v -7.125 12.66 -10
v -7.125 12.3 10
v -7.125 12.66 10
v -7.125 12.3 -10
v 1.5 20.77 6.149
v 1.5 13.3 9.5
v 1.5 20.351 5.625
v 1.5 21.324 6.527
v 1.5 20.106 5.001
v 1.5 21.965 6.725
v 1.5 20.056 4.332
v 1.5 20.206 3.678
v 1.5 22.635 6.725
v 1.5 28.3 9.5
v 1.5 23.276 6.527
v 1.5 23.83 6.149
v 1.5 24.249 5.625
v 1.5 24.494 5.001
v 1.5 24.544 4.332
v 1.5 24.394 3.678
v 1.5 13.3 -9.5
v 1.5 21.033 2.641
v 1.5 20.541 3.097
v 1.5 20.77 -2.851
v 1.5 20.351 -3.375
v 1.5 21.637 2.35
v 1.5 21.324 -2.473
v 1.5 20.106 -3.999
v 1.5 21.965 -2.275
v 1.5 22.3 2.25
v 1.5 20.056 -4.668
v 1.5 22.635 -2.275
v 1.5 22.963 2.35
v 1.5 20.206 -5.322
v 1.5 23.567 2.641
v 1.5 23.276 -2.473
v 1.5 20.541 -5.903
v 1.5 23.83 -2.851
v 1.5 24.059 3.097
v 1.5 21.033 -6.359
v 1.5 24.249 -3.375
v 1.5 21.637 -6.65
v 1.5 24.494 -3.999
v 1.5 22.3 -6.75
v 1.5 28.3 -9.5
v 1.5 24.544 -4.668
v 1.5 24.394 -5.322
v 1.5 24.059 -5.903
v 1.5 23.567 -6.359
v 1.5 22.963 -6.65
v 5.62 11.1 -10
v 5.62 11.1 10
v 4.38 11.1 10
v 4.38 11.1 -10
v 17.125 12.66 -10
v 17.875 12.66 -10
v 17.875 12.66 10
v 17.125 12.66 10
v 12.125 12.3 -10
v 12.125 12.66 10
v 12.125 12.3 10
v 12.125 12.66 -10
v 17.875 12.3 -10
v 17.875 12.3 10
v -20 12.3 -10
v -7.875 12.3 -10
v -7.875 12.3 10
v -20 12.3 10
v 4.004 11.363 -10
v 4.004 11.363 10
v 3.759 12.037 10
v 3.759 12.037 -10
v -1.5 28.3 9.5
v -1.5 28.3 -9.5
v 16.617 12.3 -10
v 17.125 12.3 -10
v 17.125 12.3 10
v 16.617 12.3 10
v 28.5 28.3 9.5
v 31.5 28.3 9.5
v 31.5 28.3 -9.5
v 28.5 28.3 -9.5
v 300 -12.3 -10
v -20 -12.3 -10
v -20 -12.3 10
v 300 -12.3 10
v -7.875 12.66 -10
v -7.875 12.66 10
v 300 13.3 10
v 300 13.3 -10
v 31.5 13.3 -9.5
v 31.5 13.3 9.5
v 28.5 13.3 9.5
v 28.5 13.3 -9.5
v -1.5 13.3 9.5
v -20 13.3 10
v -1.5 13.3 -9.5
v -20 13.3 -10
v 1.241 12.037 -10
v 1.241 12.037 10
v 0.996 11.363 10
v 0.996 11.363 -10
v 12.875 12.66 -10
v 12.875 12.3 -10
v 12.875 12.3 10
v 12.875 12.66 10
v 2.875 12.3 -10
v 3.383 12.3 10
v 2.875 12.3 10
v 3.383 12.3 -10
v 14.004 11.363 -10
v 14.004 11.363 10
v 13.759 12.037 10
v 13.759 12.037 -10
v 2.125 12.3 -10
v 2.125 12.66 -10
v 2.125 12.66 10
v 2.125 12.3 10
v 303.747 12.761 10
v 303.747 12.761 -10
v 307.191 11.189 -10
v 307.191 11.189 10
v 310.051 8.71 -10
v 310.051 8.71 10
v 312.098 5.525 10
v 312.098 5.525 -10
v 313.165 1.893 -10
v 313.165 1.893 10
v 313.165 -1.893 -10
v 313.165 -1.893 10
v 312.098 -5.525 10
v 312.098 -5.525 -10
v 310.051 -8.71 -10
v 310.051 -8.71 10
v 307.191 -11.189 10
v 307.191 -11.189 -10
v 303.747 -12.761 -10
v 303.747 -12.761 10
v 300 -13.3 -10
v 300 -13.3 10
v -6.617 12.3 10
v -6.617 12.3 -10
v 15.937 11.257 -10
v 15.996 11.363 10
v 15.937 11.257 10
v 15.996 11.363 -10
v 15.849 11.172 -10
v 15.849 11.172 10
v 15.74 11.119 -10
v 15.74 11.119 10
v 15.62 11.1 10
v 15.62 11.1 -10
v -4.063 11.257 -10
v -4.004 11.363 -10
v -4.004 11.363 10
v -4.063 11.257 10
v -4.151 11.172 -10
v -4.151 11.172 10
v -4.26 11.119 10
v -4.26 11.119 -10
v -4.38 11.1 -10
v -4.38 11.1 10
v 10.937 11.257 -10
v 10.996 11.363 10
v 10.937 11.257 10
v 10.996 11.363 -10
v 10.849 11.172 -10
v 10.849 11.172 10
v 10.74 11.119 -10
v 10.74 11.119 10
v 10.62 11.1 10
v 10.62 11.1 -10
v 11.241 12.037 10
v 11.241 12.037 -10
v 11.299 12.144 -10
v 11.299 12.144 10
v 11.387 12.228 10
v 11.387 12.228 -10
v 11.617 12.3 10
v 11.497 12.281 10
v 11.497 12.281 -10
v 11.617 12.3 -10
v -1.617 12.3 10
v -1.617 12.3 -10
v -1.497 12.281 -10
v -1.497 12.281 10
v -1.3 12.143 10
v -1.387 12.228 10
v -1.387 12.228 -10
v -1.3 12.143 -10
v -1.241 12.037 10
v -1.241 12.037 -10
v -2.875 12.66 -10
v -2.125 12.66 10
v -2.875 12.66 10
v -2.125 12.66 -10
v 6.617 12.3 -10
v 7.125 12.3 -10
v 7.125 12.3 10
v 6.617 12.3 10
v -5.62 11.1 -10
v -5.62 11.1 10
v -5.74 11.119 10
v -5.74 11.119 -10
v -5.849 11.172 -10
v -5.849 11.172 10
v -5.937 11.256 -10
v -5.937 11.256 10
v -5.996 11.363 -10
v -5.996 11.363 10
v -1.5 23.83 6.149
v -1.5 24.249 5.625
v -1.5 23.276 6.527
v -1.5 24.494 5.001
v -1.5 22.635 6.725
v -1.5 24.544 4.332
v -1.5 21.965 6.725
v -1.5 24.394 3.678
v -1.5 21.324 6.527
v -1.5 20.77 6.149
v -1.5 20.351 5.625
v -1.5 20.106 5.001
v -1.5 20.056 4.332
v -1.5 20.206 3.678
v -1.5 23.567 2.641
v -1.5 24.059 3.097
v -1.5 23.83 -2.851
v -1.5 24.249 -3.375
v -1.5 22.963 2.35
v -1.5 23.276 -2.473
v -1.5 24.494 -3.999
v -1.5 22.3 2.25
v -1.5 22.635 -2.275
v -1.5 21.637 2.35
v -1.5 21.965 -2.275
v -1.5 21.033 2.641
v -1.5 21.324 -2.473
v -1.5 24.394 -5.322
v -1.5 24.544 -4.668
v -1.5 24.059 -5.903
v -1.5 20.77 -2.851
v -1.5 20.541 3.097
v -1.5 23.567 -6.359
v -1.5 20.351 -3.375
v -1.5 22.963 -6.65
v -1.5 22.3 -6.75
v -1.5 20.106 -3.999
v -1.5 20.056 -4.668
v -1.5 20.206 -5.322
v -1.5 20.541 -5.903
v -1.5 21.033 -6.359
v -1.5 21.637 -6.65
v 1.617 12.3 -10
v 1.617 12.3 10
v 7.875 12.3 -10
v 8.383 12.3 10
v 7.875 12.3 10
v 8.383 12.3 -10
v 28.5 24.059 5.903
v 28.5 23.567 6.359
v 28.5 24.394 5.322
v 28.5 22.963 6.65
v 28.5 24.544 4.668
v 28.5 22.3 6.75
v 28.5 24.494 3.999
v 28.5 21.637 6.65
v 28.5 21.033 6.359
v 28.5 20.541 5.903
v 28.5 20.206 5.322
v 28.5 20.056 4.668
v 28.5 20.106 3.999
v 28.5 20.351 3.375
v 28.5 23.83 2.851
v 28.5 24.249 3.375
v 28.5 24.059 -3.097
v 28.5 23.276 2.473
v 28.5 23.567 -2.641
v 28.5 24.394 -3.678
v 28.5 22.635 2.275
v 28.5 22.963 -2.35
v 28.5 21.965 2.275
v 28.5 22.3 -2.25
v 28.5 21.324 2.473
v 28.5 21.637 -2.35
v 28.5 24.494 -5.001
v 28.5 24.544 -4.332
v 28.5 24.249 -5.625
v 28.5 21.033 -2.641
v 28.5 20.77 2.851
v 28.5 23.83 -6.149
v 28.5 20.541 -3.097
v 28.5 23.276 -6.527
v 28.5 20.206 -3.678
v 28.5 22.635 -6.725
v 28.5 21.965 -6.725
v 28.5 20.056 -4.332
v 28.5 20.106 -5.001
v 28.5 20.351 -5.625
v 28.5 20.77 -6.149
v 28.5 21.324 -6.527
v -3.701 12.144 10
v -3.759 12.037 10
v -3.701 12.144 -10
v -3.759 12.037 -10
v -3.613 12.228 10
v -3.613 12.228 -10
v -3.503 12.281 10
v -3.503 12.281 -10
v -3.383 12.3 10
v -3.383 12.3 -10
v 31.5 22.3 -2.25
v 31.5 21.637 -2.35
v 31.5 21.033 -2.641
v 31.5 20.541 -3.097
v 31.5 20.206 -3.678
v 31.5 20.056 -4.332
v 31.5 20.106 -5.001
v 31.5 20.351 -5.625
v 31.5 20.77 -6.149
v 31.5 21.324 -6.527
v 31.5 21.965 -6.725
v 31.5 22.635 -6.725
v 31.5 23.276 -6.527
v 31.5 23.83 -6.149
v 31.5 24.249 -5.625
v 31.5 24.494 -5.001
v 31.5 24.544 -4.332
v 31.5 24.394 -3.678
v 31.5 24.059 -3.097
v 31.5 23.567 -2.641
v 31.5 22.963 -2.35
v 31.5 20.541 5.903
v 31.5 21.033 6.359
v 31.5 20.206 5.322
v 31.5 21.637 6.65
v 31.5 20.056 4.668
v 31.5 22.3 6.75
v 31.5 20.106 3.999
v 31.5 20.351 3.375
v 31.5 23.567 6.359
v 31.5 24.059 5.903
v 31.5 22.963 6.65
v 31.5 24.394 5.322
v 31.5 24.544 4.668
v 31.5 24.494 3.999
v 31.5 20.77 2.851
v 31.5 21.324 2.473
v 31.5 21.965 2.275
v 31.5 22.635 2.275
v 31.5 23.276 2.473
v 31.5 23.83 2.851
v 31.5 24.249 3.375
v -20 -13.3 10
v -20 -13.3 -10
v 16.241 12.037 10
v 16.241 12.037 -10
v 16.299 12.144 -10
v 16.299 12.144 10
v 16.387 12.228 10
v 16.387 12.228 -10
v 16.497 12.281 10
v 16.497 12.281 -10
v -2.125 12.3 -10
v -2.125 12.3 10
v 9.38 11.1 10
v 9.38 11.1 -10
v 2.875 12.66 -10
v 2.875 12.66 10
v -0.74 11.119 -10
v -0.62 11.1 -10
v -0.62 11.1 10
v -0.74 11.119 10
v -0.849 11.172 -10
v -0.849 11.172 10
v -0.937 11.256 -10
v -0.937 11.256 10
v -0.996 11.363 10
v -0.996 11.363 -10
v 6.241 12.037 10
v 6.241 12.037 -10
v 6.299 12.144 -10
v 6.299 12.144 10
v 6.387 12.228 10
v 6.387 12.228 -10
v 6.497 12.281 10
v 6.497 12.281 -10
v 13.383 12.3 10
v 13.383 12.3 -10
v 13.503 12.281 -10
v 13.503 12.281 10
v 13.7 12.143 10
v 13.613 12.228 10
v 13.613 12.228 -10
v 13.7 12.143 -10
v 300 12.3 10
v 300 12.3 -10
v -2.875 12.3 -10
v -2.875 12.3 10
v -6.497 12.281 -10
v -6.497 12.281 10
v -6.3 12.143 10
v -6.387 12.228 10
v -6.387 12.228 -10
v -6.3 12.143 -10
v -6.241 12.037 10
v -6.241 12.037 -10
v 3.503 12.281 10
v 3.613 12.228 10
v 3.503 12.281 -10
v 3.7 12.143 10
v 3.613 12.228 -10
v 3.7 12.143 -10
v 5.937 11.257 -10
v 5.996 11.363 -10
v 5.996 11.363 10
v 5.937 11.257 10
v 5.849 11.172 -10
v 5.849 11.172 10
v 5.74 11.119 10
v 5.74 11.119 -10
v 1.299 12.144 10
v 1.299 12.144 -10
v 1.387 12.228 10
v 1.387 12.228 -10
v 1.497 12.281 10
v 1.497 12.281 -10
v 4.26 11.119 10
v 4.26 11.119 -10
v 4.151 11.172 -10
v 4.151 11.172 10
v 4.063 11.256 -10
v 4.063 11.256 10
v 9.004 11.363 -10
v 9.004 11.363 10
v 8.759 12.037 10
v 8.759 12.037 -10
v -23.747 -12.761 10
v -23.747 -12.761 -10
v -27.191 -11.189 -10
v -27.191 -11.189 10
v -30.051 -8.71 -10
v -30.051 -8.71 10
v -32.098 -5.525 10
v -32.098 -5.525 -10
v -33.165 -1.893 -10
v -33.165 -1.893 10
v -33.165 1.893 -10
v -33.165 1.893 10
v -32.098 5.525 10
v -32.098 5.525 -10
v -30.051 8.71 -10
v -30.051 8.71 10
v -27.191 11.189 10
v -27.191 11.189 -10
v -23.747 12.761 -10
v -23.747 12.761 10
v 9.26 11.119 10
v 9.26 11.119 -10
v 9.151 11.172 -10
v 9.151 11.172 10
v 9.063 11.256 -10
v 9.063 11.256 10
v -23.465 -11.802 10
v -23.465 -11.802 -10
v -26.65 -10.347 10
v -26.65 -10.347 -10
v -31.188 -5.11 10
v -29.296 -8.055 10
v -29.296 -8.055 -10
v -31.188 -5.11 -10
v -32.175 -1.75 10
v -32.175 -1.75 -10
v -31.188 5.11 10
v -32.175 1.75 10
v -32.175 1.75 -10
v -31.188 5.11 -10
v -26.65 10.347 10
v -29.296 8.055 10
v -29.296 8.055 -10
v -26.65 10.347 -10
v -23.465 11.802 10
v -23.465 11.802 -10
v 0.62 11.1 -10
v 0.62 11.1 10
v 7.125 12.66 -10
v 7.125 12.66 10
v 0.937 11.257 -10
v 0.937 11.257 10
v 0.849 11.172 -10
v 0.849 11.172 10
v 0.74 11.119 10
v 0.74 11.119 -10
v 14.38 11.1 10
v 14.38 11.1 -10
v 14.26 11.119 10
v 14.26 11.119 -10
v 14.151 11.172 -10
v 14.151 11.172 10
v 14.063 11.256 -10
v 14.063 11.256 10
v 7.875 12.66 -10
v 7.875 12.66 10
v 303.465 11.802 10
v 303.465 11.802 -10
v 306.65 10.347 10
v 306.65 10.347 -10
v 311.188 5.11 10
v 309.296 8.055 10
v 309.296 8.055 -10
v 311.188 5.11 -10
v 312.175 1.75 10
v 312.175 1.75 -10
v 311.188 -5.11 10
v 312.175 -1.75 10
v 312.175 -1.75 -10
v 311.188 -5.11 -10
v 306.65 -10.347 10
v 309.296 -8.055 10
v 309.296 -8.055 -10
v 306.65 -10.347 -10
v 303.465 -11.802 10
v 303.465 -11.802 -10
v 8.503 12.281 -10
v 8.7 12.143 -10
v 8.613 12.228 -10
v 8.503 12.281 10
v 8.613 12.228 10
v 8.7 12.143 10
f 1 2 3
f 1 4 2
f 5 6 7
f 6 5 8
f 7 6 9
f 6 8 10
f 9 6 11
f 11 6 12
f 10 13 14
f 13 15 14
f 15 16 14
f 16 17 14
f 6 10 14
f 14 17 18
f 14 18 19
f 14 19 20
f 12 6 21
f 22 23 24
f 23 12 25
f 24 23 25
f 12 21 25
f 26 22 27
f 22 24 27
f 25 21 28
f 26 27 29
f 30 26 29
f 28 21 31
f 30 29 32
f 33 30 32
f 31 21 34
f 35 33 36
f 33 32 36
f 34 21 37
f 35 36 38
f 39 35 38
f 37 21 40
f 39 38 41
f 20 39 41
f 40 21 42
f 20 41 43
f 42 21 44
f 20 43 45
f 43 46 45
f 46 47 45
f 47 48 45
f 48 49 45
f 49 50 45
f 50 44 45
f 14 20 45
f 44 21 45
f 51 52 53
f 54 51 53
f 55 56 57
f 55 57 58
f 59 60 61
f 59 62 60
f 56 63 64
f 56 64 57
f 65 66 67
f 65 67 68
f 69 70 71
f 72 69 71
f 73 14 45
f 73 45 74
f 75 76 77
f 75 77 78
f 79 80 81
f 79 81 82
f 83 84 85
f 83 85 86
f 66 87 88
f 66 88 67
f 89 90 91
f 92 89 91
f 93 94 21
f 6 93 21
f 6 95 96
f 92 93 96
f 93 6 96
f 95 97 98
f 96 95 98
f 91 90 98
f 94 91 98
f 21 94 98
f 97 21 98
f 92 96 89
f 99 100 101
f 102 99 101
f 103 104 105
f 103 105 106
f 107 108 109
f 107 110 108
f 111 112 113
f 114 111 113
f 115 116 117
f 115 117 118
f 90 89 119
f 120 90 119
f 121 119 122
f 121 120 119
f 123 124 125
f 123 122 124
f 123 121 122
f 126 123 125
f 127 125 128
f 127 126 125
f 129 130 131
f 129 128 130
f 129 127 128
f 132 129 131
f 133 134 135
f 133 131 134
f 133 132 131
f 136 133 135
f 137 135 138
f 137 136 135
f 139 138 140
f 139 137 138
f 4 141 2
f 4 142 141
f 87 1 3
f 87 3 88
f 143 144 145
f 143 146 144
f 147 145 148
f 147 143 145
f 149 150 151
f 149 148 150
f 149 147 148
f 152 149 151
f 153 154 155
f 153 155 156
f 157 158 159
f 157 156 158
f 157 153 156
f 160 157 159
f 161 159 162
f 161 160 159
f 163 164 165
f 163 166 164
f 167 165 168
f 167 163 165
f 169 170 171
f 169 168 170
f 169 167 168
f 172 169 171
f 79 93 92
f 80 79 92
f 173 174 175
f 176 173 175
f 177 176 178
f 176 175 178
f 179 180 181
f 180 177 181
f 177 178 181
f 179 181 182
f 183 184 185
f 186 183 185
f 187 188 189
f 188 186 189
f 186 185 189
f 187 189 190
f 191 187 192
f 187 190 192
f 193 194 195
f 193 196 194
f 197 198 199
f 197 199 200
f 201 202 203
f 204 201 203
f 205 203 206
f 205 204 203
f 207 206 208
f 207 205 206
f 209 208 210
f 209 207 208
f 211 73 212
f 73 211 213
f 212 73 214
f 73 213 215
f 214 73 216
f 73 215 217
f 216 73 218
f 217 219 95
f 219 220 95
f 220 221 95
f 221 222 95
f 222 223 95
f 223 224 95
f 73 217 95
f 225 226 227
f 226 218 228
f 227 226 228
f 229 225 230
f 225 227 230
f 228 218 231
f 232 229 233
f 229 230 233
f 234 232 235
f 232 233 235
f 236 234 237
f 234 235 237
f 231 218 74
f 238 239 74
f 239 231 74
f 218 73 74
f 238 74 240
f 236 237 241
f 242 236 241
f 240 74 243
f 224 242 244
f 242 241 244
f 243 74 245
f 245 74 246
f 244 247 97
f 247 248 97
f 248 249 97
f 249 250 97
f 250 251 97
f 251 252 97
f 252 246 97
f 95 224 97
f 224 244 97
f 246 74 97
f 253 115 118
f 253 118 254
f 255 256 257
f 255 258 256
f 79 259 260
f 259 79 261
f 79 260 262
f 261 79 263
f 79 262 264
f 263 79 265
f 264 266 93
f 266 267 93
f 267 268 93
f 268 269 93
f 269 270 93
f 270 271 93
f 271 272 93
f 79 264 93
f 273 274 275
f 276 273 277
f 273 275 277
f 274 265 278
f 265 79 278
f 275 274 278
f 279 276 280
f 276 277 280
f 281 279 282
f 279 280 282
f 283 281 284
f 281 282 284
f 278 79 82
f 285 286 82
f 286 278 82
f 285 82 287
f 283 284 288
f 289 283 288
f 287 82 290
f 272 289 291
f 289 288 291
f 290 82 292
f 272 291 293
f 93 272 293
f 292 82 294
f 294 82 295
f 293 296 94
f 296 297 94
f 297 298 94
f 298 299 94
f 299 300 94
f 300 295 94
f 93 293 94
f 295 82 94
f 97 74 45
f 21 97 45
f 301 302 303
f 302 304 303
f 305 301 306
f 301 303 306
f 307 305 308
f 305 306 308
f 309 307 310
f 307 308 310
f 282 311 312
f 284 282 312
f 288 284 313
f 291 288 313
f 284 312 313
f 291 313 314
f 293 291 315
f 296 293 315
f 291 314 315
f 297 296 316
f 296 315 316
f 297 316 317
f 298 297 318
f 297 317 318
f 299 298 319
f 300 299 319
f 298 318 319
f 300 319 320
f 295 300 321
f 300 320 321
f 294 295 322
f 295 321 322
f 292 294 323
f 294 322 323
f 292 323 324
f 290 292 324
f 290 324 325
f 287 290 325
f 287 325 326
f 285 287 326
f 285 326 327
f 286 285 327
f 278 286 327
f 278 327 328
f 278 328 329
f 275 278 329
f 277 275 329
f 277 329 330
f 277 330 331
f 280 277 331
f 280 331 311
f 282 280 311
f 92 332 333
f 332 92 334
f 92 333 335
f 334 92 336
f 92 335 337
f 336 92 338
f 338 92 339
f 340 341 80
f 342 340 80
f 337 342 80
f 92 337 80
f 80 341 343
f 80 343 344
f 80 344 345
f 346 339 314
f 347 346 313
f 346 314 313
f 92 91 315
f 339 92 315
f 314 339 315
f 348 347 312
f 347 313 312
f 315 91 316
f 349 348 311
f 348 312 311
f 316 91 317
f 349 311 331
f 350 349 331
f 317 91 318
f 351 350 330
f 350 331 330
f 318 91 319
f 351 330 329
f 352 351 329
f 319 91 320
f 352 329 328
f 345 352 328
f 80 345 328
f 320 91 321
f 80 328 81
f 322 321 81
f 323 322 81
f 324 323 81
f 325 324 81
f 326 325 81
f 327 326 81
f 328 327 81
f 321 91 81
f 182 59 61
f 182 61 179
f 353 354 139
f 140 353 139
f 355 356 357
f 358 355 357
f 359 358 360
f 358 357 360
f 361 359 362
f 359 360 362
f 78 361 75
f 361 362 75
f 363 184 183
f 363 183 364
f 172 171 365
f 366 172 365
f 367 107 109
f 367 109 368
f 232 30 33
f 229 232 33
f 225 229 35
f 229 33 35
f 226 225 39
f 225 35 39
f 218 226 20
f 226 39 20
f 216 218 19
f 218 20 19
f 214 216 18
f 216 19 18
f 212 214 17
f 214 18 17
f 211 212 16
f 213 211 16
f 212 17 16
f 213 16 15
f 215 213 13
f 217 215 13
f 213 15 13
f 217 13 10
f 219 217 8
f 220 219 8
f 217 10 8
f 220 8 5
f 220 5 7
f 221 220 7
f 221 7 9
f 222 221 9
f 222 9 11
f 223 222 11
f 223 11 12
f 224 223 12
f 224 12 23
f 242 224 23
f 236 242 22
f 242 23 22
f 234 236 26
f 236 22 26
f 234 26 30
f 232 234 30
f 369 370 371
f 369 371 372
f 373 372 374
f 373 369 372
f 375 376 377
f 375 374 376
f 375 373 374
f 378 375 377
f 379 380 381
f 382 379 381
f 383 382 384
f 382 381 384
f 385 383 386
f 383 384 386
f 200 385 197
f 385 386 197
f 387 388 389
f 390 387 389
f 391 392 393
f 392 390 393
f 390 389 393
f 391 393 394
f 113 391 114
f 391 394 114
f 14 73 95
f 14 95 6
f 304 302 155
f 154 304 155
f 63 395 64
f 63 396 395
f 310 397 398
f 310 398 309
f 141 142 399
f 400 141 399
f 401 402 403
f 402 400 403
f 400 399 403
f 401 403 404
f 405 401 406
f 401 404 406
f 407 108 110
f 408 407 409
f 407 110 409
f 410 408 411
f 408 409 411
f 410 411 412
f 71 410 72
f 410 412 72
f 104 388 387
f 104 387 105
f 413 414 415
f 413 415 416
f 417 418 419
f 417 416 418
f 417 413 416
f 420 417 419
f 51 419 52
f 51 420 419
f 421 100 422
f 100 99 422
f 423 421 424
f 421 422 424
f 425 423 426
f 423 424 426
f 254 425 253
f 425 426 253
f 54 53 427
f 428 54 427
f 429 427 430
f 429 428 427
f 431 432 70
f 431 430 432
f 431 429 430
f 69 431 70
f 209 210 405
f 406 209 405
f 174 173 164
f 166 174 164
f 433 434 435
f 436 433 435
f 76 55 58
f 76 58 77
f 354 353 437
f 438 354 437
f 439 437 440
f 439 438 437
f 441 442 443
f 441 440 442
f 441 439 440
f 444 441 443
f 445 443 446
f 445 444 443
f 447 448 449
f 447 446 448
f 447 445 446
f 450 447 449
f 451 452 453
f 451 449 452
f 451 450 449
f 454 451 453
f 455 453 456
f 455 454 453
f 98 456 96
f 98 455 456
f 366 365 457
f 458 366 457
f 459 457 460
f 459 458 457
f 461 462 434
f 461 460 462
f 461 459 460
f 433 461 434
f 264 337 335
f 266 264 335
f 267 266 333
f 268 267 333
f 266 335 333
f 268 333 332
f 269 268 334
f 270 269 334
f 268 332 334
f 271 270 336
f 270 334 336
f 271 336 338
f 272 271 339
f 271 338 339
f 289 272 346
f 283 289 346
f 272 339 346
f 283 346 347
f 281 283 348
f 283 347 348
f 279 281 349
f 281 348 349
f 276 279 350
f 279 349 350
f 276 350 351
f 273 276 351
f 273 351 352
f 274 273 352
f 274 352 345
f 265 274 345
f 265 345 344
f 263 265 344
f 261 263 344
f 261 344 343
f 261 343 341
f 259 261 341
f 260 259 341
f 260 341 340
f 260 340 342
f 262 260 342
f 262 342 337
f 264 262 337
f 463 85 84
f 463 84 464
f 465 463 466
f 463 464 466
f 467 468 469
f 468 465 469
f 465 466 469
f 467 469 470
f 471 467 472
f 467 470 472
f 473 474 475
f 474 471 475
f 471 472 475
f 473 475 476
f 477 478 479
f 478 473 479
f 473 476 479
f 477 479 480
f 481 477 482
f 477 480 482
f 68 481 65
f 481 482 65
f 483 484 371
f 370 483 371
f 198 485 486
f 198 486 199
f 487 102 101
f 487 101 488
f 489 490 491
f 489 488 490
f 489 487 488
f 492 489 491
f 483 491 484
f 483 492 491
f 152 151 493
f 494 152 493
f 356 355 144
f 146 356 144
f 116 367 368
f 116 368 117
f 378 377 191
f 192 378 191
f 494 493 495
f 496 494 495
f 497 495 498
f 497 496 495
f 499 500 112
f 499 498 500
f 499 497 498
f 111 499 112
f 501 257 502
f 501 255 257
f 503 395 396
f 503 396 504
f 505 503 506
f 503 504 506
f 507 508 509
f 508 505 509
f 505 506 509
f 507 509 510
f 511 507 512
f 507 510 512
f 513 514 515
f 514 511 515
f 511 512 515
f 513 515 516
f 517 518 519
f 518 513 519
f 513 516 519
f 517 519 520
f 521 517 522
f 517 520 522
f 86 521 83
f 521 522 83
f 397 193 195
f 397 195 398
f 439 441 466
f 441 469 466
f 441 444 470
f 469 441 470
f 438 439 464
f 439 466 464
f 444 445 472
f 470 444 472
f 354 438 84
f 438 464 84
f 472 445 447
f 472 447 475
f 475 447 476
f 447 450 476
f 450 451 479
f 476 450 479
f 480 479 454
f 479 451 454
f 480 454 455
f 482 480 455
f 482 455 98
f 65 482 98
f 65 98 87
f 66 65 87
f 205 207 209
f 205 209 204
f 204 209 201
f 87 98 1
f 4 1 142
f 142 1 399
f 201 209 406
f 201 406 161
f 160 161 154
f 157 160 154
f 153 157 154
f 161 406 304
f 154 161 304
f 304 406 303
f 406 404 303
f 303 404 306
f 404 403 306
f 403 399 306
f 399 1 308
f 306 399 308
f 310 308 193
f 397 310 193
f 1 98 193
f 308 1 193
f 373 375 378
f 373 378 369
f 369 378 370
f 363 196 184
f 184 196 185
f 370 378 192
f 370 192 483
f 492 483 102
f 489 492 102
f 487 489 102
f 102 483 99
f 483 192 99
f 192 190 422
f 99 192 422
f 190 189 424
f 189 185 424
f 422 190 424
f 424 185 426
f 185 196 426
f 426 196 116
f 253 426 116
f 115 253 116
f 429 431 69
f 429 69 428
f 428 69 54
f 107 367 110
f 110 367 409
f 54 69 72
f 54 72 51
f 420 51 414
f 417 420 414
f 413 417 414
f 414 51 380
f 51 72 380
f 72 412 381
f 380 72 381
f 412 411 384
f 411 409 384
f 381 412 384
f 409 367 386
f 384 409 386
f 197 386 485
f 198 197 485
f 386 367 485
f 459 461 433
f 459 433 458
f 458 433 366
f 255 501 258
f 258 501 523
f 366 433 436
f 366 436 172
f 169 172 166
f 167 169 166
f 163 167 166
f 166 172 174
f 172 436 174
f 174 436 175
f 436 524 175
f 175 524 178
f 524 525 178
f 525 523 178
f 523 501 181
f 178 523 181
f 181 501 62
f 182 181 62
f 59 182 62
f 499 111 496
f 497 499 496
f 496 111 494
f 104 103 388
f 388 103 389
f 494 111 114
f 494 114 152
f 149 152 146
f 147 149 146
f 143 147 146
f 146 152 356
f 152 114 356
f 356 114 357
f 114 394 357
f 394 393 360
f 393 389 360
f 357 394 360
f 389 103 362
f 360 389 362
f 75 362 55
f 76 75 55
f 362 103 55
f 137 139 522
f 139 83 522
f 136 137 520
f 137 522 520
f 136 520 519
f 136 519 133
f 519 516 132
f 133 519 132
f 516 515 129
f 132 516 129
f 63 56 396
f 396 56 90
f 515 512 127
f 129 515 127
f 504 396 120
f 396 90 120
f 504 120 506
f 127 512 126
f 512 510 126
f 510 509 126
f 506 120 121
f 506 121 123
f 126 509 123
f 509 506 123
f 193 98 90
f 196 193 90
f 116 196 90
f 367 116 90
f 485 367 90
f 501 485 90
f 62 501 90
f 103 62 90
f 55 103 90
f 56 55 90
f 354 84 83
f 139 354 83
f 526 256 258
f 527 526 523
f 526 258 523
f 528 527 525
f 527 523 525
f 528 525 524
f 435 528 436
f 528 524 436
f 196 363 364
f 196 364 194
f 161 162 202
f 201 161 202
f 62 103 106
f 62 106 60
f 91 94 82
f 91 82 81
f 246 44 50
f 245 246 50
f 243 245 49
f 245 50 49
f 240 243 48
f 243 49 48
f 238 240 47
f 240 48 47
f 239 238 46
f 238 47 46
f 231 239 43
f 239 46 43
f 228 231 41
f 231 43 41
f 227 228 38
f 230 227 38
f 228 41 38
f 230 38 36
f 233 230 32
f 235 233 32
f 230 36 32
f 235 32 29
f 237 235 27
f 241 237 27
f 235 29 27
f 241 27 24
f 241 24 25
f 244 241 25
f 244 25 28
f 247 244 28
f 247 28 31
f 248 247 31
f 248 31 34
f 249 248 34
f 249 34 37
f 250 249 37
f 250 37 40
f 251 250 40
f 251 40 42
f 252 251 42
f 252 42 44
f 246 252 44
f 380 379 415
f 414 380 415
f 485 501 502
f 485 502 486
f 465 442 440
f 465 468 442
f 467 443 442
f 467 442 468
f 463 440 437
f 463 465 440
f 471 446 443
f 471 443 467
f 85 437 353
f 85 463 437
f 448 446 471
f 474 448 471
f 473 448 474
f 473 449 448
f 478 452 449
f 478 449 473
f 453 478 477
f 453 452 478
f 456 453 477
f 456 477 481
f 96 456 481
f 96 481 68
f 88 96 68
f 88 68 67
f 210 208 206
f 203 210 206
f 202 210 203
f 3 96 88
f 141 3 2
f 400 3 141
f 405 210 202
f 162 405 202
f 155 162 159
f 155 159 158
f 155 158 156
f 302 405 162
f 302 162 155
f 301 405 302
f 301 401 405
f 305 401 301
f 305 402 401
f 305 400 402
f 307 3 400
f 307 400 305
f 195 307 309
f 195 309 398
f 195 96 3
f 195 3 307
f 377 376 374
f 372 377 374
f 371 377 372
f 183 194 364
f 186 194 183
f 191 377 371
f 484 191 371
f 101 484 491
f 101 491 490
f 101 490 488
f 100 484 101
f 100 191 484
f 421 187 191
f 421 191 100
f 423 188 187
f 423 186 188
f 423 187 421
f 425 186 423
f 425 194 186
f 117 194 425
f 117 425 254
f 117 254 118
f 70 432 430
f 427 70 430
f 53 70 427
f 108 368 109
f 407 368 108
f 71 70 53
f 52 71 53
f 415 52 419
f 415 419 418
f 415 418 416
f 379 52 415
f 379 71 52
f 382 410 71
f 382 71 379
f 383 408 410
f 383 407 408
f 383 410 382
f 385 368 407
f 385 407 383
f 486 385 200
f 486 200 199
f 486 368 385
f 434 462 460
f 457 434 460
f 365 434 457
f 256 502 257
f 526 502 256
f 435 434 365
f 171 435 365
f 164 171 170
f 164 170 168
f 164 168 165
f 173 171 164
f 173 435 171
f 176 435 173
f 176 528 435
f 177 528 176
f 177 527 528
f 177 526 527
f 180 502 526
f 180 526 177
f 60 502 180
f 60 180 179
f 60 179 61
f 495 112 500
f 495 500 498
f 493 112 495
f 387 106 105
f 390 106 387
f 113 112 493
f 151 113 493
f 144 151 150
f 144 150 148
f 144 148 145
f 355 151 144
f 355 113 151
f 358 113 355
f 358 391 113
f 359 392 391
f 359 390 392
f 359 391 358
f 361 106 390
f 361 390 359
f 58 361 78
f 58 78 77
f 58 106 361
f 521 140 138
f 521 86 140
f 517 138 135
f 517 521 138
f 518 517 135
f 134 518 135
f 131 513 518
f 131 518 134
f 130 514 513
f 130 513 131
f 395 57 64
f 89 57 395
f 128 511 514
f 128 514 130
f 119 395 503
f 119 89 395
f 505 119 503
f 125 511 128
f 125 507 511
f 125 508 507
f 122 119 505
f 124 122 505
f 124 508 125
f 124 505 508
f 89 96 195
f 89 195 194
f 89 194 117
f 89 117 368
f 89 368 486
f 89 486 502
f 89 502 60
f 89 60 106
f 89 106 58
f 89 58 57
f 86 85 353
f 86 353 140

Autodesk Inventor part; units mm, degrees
ref_plane "XZ Plane" through (0, 0, 0) normal (0, 1, 0) x (-1, 0, 0)
sketch "Sketch_2" plane through (0, 0, 0) normal (0, 0, 1) x (1, 0, 0)
  arc A0 (-20, 13.3) -> (-20, -13.3) centre (-20, 0) ccw
  line L0 (-20, -13.3) -> (300, -13.3)
  arc A1 (300, -13.3) -> (300, 13.3) centre (300, 0) ccw
  line L1 (300, 13.3) -> (-20, 13.3)
extrude "Extrusion1" add sketch "Sketch_2" along normal mid plane 20
sketch "Sketch_8" plane through (0, 0, 0) normal (0, 0, 1) x (1, 0, 0)
  line L0 (-1.5, 28.3) -> (-1.5, 13.3)
  line L1 (-1.5, 13.3) -> (1.5, 13.3)
  line L2 (1.5, 13.3) -> (1.5, 28.3)
  line L3 (1.5, 28.3) -> (-1.5, 28.3)
extrude "Extrusion2" add sketch "Sketch_8" along normal mid plane 19
sketch "_____4" plane through (0, 0, 0) normal (1, 0, 0) x (0, 0, -1)
  circle A0 centre (-4.5, 22.3) radius 2.25
extrude "Extrusion3" cut sketch "_____4" along normal mid plane 6
sketch "_____5" plane through (0, 0, 0) normal (1, 0, 0) x (0, 0, -1)
  circle A0 centre (4.5, 22.3) radius 2.25
extrude "Extrusion4" cut sketch "_____5" along normal mid plane 6
sketch "_____2" plane through (0, 0, 0) normal (0, 0, 1) x (1, 0, 0)
  line L0 (28.5, 8.3) -> (31.5, 8.3)
  line L1 (31.5, 8.3) -> (31.5, 28.3)
  line L2 (31.5, 28.3) -> (28.5, 28.3)
  line L3 (28.5, 28.3) -> (28.5, 8.3)
extrude "Extrusion5" add sketch "_____2" along normal mid plane 19
sketch "Sketch6" plane through (28.5, 13.3, 9.5) normal (-1, 0, 0) x (0, 0, 1)
  point P0 (-14, 9)
hole "Hole1" at (28.5, 22.3, -4.5) direction (1, 0, 0) diameter 4.5 depth 3
sketch "Sketch7" plane through (28.5, 13.3, 9.5) normal (-1, 0, 0) x (0, 0, 1)
  point P0 (-5, 9)
hole "Hole2" at (28.5, 22.3, 4.5) direction (1, 0, 0) diameter 4.5 depth 3
sketch "Sketch_4" plane through (0, 0, 0) normal (0, 0, 1) x (1, 0, 0)
  arc A0 (-20, 12.3) -> (-20, -12.3) centre (-20, 0) ccw
  line L0 (-20, -12.3) -> (300, -12.3)
  arc A1 (300, -12.3) -> (300, 12.3) centre (300, 0) ccw
  line L1 (300, 12.3) -> (17.5, 12.3)
  line L2 (17.5, 12.3) -> (17.5, 11.1)
  line L3 (17.5, 11.1) -> (-7.5, 11.1)
  line L4 (-7.5, 11.1) -> (-7.5, 12.3)
  line L5 (-7.5, 12.3) -> (-20, 12.3)
extrude "Extrusion6" cut sketch "Sketch_4" along normal mid plane 20
sketch "Sketch_64" plane through (0, 0, 0) normal (0, 0, 1) x (1, 0, 0)
  line L0 (-9.3801, 11.1) -> (-9.3801, 10.1)
  line L1 (-9.3801, 10.1) -> (-5.6199, 10.1)
  line L2 (-5.6199, 10.1) -> (-5.6199, 11.1)
  arc A0 (-5.9958, 11.3632) -> (-5.6199, 11.1) centre (-5.6199, 11.5) ccw
  line L3 (-5.9958, 11.3632) -> (-6.241, 12.0368)
  arc A1 (-6.241, 12.0368) -> (-6.6168, 12.3) centre (-6.6168, 11.9) ccw
  line L4 (-6.6168, 12.3) -> (-7.125, 12.3)
  line L5 (-7.125, 12.3) -> (-7.125, 12.66)
  line L6 (-7.125, 12.66) -> (-7.875, 12.66)
  line L7 (-7.875, 12.66) -> (-7.875, 12.3)
  line L8 (-7.875, 12.3) -> (-8.3832, 12.3)
  arc A2 (-8.3832, 12.3) -> (-8.759, 12.0368) centre (-8.3832, 11.9) ccw
  line L9 (-8.759, 12.0368) -> (-9.0042, 11.3632)
  arc A3 (-9.3801, 11.1) -> (-9.0042, 11.3632) centre (-9.3801, 11.5) ccw
extrude "Extrusion7" cut sketch "Sketch_64" along normal mid plane 20
pattern_linear "Rectangular Pattern1" count 6 spacing 5 along (1, 0, 0) of "Extrusion7"
ref_plane "作業平面3" through (140, 0, 0) normal (1, 0, 0) x (0, 1, 0)
ref_plane "作業平面1" through (313.3, 0, 0) normal (1, 0, 0) x (0, 1, 0)
ref_plane "作業平面2" through (-33.3, 0, 0) normal (1, 0, 0) x (0, 1, 0)
ref_plane "作業平面6" through (140, 0, 0) normal (1, 0, 0) x (0, 1, 0)
ref_plane "作業平面4" through (313.3, 0, 0) normal (1, 0, 0) x (0, 1, 0)
ref_plane "作業平面5" through (-33.3, 0, 0) normal (1, 0, 0) x (0, 1, 0)
properties part number "ATBT-720T5200-B-P30_info-1-16-16"
